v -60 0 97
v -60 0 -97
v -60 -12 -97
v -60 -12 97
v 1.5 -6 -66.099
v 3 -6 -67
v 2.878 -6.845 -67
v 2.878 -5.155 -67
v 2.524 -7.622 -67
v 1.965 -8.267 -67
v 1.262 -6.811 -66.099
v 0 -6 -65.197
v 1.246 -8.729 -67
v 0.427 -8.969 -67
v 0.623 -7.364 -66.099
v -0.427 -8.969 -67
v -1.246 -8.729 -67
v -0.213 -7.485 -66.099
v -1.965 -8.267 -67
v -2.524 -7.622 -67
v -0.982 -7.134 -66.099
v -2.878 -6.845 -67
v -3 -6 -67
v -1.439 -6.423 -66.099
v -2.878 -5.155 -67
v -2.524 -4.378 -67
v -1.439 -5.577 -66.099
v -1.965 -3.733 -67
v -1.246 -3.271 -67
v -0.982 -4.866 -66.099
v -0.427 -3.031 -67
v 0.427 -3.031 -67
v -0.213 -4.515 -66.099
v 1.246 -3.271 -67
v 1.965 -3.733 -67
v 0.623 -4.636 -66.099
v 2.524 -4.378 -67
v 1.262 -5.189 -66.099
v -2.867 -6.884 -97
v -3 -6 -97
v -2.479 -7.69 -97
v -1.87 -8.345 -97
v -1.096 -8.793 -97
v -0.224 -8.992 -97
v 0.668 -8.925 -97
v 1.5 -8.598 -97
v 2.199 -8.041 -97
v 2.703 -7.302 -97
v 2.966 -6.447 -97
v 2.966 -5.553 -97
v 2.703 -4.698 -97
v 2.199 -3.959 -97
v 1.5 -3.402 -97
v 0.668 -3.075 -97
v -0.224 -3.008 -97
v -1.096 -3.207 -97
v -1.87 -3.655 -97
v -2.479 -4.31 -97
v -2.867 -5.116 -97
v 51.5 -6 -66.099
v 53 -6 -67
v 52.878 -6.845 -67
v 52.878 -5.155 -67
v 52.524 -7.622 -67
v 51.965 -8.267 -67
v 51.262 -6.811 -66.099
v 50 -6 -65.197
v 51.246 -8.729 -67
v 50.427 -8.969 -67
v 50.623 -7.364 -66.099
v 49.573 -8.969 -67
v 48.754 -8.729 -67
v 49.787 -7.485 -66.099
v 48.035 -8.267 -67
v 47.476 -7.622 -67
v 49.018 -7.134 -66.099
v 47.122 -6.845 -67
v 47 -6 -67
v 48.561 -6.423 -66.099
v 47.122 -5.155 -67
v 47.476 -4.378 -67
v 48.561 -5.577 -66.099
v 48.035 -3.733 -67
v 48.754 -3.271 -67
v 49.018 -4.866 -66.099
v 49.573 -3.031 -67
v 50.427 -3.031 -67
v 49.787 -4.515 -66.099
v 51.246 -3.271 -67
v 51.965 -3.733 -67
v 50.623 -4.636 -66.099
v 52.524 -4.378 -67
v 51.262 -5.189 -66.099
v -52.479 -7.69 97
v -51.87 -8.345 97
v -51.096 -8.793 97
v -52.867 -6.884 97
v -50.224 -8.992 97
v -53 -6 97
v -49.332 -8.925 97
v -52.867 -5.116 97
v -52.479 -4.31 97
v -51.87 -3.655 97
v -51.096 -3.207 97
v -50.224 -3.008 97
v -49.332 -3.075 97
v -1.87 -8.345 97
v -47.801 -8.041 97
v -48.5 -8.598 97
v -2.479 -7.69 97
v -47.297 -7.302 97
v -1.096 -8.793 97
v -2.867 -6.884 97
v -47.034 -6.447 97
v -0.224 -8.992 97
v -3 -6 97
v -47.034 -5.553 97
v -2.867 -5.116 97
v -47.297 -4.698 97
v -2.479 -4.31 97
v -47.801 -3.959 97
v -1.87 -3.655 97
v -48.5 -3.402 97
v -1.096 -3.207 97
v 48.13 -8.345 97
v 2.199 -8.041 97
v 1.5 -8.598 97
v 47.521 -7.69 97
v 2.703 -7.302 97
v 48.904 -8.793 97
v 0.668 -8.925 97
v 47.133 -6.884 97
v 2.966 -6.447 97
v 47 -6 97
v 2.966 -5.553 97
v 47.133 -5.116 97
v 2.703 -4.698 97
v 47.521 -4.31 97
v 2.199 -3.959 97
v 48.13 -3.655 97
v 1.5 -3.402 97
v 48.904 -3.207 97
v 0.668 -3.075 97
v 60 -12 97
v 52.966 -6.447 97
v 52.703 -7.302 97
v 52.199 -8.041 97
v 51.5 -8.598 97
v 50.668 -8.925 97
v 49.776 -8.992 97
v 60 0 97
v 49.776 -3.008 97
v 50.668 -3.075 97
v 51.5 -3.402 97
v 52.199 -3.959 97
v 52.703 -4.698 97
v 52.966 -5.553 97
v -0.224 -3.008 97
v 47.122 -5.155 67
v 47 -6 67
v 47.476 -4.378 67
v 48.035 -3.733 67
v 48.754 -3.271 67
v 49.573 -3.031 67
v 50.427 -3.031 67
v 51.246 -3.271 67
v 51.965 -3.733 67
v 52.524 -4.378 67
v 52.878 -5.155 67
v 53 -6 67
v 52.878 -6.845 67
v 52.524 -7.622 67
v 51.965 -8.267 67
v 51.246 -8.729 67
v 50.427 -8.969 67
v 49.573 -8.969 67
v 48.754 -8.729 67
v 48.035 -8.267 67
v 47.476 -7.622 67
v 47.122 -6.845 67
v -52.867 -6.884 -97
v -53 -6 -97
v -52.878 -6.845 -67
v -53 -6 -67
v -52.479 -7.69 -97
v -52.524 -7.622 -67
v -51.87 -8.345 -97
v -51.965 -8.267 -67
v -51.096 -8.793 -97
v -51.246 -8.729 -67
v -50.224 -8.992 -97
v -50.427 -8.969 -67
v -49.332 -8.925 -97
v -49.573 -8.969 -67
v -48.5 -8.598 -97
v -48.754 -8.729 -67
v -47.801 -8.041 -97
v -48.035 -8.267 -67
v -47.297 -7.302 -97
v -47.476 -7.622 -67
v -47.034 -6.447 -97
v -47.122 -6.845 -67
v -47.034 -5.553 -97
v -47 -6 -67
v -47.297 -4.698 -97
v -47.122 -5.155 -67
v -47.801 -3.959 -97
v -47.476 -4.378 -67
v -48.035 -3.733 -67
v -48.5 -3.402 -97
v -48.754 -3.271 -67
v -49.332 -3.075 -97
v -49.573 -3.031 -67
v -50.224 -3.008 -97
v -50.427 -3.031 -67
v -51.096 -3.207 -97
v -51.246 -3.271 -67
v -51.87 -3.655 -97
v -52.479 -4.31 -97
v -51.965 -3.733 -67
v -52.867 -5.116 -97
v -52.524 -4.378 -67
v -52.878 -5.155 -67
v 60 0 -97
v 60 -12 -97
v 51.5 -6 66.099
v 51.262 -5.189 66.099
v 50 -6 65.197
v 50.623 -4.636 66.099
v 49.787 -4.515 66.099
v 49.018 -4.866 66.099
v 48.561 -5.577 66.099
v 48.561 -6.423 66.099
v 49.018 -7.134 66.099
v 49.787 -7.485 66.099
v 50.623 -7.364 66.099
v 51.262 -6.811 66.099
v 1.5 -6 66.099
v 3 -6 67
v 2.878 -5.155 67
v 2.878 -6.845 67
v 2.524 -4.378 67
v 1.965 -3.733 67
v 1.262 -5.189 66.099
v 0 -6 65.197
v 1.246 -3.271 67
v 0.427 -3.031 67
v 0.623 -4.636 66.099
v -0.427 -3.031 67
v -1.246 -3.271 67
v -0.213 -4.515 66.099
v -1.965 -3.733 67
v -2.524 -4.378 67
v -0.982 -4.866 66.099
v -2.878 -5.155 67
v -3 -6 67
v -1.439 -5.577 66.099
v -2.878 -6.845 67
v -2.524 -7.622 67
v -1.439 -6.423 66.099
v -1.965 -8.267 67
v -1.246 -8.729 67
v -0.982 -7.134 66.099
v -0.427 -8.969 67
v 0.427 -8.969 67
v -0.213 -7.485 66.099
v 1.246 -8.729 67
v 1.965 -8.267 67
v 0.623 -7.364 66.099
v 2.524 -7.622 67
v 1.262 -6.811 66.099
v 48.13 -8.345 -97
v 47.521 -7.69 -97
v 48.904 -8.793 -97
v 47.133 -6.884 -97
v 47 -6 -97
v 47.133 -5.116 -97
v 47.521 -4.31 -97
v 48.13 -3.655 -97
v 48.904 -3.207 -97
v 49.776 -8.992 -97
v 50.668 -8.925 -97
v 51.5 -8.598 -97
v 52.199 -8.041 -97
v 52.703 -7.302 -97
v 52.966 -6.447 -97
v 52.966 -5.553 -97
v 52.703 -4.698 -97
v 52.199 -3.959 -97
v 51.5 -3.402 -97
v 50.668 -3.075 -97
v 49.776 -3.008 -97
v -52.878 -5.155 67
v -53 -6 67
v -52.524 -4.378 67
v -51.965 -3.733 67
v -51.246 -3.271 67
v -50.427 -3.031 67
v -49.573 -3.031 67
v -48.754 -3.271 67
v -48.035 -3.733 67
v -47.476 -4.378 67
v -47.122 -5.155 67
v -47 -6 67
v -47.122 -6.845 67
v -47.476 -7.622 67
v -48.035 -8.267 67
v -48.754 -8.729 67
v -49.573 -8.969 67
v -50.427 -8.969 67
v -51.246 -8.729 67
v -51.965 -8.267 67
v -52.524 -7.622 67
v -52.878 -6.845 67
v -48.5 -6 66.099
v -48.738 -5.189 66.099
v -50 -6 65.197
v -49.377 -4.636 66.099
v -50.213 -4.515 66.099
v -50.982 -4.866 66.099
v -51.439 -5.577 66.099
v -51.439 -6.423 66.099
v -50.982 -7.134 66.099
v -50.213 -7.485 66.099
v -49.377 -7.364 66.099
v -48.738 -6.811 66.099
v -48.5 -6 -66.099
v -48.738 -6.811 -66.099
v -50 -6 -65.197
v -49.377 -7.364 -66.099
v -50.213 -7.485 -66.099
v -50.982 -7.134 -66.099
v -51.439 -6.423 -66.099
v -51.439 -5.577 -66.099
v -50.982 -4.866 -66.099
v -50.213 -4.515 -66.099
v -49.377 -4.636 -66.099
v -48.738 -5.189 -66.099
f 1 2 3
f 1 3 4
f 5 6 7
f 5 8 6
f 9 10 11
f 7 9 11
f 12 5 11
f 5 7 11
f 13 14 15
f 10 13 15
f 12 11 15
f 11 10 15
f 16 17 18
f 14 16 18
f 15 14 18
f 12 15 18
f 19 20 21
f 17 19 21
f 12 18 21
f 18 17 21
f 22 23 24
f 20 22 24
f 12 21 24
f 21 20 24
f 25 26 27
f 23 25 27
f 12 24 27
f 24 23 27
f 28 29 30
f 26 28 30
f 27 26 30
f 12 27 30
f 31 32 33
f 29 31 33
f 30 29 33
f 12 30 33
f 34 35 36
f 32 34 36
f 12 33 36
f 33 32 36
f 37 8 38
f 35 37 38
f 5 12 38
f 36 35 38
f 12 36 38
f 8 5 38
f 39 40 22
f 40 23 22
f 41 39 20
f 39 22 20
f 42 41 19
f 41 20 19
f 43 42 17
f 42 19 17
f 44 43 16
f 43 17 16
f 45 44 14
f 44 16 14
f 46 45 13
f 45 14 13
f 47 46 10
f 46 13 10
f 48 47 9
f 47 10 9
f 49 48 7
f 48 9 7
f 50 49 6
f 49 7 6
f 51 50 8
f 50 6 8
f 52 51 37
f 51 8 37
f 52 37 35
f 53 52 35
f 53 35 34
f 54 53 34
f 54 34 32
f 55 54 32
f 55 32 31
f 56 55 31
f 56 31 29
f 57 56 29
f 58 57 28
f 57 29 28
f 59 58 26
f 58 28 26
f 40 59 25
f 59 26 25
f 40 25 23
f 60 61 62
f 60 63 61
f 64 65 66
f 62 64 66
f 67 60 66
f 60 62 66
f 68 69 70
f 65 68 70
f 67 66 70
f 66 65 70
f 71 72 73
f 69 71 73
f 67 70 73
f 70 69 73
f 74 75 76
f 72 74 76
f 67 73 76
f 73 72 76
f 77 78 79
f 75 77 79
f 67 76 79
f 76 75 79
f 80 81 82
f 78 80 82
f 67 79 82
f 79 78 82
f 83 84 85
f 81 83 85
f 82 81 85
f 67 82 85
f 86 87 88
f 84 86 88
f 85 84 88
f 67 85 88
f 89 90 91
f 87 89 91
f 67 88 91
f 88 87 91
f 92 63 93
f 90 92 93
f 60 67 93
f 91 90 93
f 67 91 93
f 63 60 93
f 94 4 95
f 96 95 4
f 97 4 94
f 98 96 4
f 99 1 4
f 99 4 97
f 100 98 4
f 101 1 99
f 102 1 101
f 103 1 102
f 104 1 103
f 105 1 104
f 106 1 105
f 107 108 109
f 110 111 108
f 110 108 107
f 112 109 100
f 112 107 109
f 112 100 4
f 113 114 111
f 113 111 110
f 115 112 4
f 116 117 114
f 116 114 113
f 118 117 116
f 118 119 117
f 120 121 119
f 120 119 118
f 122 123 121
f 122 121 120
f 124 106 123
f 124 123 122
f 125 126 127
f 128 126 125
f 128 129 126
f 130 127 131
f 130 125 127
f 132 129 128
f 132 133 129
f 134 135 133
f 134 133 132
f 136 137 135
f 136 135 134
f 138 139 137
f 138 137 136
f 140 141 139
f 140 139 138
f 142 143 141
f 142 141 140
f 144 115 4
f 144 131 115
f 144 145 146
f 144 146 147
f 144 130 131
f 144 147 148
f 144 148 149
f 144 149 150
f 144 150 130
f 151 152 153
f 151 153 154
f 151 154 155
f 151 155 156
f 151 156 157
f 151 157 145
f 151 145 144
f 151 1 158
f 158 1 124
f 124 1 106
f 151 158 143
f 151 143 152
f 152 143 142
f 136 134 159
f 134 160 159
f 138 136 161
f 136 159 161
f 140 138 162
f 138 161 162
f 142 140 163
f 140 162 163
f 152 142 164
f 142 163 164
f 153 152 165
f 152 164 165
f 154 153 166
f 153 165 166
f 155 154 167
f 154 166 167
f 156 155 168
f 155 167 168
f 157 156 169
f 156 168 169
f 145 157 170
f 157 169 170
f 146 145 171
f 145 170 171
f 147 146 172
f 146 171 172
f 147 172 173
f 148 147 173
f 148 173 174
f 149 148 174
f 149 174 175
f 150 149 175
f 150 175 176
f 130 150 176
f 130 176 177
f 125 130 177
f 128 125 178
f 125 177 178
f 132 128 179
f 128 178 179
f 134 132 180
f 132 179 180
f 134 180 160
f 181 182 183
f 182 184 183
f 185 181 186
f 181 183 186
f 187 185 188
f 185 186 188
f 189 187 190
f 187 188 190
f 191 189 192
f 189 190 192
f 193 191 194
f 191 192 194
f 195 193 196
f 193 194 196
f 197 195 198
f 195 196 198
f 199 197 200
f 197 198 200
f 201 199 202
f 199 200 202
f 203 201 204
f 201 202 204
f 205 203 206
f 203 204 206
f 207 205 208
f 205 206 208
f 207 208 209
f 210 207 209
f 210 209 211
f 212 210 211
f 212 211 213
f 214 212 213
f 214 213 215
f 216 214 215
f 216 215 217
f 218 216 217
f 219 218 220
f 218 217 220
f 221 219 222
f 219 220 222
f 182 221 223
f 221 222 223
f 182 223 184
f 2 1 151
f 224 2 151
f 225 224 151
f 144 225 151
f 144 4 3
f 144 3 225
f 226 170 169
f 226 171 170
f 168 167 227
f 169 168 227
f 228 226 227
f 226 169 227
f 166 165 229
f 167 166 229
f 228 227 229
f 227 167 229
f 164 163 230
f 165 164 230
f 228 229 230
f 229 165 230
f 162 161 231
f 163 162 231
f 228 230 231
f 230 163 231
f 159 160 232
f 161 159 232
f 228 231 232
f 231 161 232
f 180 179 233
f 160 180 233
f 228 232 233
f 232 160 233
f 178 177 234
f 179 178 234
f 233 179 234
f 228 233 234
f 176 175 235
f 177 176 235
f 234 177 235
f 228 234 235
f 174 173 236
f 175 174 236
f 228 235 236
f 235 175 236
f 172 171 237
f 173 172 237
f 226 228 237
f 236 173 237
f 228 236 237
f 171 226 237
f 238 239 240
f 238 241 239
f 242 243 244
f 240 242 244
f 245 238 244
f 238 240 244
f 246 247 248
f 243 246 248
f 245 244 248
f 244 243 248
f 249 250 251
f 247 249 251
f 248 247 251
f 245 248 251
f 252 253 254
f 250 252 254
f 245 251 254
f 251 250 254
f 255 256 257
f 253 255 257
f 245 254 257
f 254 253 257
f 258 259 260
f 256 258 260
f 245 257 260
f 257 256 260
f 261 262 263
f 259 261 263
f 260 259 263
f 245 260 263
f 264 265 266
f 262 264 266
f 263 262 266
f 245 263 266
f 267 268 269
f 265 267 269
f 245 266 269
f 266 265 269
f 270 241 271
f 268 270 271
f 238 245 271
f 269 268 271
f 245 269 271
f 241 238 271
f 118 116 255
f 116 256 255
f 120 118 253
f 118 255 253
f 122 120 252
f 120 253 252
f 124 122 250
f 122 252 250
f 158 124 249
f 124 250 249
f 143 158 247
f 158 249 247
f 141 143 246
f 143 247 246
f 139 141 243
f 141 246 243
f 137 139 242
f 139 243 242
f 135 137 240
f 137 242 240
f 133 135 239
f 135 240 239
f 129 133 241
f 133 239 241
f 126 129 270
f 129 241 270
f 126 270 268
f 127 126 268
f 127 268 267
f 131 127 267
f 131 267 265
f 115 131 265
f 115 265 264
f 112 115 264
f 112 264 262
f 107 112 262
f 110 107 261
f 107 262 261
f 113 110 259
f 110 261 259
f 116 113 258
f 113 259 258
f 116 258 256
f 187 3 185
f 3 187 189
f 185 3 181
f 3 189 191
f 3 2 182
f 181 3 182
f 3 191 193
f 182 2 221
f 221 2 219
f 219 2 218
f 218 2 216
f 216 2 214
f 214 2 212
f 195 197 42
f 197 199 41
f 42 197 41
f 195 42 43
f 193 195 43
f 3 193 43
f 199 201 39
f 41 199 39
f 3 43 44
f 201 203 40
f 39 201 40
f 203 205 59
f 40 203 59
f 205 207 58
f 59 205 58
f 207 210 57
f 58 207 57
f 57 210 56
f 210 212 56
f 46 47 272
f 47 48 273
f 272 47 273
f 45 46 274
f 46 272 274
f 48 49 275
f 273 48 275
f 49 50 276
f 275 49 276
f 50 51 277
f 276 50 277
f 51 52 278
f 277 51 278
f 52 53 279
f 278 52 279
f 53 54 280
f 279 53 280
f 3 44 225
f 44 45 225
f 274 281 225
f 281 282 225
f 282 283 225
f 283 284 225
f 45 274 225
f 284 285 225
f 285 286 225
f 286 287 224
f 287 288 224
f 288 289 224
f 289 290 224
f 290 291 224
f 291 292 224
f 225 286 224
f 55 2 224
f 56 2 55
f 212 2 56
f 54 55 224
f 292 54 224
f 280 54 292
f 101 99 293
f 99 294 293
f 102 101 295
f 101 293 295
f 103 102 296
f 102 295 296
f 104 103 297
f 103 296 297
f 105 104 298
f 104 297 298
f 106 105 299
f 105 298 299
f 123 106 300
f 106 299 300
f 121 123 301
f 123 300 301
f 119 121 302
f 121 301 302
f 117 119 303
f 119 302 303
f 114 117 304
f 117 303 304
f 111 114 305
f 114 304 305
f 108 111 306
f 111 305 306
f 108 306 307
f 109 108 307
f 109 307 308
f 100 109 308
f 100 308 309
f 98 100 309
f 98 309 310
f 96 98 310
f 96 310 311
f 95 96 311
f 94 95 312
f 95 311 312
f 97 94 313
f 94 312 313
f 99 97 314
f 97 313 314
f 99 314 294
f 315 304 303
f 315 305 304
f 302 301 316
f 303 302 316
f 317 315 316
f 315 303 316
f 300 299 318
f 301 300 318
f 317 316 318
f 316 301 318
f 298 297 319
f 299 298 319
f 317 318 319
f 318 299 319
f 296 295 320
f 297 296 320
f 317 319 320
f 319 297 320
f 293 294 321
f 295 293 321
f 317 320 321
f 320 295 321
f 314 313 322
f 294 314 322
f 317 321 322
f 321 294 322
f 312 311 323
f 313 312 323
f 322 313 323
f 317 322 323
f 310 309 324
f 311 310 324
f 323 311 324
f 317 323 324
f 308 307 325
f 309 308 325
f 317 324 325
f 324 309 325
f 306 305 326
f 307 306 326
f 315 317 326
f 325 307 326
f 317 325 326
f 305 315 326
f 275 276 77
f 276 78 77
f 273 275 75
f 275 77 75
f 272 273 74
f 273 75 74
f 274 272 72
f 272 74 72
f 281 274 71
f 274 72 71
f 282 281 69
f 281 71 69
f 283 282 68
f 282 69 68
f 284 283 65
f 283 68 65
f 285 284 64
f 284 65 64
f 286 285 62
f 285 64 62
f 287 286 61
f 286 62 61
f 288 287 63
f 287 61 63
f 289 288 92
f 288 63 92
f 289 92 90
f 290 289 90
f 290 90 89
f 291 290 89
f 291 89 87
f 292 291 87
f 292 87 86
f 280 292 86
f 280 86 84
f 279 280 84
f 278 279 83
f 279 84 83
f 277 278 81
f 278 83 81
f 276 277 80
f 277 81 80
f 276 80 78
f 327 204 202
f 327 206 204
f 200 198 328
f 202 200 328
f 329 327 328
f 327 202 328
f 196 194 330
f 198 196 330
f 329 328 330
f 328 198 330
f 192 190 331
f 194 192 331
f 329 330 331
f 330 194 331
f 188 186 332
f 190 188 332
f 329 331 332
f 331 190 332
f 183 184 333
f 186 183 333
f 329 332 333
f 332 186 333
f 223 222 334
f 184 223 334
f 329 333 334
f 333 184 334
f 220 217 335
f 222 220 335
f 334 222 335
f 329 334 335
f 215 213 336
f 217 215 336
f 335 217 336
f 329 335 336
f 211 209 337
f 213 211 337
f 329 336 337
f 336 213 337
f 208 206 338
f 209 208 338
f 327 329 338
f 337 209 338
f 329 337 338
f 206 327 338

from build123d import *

# Parameters (mm, degrees)
F0_W     = 120
F0_H     = 194
F1_DEPTH = 12
F3_D     = 6
F3_DEPTH = 30
F3_TIP   = 1.8025818571
F5_D     = 6
F5_DEPTH = 30
F5_TIP   = 1.8025818571


with BuildPart() as f1:
    # F0 (on Front) → F1 (new body)
    with BuildSketch(Plane.XZ):
        Rectangle(F0_W, F0_H)
    extrude(amount=F1_DEPTH)

    # F3
    with Locations(Plane.XY.offset(97)):
        with Locations((-50, -6), (0, -6), (50, -6)):
            Hole(F3_D / 2, depth=F3_DEPTH)
            with Locations((0, 0, -(F3_DEPTH + F3_TIP / 2))):  # 118° drill point
                Cone(0, F3_D / 2, F3_TIP, mode=Mode.SUBTRACT)

    # F5
    with Locations(Plane(origin=(0, 0, -97), x_dir=(1, 0, 0), z_dir=(0, 0, -1))):
        with Locations((-50, 6), (0, 6), (50, 6)):
            Hole(F5_D / 2, depth=F5_DEPTH)
            with Locations((0, 0, -(F5_DEPTH + F5_TIP / 2))):  # 118° drill point
                Cone(0, F5_D / 2, F5_TIP, mode=Mode.SUBTRACT)


solid = f1.part
